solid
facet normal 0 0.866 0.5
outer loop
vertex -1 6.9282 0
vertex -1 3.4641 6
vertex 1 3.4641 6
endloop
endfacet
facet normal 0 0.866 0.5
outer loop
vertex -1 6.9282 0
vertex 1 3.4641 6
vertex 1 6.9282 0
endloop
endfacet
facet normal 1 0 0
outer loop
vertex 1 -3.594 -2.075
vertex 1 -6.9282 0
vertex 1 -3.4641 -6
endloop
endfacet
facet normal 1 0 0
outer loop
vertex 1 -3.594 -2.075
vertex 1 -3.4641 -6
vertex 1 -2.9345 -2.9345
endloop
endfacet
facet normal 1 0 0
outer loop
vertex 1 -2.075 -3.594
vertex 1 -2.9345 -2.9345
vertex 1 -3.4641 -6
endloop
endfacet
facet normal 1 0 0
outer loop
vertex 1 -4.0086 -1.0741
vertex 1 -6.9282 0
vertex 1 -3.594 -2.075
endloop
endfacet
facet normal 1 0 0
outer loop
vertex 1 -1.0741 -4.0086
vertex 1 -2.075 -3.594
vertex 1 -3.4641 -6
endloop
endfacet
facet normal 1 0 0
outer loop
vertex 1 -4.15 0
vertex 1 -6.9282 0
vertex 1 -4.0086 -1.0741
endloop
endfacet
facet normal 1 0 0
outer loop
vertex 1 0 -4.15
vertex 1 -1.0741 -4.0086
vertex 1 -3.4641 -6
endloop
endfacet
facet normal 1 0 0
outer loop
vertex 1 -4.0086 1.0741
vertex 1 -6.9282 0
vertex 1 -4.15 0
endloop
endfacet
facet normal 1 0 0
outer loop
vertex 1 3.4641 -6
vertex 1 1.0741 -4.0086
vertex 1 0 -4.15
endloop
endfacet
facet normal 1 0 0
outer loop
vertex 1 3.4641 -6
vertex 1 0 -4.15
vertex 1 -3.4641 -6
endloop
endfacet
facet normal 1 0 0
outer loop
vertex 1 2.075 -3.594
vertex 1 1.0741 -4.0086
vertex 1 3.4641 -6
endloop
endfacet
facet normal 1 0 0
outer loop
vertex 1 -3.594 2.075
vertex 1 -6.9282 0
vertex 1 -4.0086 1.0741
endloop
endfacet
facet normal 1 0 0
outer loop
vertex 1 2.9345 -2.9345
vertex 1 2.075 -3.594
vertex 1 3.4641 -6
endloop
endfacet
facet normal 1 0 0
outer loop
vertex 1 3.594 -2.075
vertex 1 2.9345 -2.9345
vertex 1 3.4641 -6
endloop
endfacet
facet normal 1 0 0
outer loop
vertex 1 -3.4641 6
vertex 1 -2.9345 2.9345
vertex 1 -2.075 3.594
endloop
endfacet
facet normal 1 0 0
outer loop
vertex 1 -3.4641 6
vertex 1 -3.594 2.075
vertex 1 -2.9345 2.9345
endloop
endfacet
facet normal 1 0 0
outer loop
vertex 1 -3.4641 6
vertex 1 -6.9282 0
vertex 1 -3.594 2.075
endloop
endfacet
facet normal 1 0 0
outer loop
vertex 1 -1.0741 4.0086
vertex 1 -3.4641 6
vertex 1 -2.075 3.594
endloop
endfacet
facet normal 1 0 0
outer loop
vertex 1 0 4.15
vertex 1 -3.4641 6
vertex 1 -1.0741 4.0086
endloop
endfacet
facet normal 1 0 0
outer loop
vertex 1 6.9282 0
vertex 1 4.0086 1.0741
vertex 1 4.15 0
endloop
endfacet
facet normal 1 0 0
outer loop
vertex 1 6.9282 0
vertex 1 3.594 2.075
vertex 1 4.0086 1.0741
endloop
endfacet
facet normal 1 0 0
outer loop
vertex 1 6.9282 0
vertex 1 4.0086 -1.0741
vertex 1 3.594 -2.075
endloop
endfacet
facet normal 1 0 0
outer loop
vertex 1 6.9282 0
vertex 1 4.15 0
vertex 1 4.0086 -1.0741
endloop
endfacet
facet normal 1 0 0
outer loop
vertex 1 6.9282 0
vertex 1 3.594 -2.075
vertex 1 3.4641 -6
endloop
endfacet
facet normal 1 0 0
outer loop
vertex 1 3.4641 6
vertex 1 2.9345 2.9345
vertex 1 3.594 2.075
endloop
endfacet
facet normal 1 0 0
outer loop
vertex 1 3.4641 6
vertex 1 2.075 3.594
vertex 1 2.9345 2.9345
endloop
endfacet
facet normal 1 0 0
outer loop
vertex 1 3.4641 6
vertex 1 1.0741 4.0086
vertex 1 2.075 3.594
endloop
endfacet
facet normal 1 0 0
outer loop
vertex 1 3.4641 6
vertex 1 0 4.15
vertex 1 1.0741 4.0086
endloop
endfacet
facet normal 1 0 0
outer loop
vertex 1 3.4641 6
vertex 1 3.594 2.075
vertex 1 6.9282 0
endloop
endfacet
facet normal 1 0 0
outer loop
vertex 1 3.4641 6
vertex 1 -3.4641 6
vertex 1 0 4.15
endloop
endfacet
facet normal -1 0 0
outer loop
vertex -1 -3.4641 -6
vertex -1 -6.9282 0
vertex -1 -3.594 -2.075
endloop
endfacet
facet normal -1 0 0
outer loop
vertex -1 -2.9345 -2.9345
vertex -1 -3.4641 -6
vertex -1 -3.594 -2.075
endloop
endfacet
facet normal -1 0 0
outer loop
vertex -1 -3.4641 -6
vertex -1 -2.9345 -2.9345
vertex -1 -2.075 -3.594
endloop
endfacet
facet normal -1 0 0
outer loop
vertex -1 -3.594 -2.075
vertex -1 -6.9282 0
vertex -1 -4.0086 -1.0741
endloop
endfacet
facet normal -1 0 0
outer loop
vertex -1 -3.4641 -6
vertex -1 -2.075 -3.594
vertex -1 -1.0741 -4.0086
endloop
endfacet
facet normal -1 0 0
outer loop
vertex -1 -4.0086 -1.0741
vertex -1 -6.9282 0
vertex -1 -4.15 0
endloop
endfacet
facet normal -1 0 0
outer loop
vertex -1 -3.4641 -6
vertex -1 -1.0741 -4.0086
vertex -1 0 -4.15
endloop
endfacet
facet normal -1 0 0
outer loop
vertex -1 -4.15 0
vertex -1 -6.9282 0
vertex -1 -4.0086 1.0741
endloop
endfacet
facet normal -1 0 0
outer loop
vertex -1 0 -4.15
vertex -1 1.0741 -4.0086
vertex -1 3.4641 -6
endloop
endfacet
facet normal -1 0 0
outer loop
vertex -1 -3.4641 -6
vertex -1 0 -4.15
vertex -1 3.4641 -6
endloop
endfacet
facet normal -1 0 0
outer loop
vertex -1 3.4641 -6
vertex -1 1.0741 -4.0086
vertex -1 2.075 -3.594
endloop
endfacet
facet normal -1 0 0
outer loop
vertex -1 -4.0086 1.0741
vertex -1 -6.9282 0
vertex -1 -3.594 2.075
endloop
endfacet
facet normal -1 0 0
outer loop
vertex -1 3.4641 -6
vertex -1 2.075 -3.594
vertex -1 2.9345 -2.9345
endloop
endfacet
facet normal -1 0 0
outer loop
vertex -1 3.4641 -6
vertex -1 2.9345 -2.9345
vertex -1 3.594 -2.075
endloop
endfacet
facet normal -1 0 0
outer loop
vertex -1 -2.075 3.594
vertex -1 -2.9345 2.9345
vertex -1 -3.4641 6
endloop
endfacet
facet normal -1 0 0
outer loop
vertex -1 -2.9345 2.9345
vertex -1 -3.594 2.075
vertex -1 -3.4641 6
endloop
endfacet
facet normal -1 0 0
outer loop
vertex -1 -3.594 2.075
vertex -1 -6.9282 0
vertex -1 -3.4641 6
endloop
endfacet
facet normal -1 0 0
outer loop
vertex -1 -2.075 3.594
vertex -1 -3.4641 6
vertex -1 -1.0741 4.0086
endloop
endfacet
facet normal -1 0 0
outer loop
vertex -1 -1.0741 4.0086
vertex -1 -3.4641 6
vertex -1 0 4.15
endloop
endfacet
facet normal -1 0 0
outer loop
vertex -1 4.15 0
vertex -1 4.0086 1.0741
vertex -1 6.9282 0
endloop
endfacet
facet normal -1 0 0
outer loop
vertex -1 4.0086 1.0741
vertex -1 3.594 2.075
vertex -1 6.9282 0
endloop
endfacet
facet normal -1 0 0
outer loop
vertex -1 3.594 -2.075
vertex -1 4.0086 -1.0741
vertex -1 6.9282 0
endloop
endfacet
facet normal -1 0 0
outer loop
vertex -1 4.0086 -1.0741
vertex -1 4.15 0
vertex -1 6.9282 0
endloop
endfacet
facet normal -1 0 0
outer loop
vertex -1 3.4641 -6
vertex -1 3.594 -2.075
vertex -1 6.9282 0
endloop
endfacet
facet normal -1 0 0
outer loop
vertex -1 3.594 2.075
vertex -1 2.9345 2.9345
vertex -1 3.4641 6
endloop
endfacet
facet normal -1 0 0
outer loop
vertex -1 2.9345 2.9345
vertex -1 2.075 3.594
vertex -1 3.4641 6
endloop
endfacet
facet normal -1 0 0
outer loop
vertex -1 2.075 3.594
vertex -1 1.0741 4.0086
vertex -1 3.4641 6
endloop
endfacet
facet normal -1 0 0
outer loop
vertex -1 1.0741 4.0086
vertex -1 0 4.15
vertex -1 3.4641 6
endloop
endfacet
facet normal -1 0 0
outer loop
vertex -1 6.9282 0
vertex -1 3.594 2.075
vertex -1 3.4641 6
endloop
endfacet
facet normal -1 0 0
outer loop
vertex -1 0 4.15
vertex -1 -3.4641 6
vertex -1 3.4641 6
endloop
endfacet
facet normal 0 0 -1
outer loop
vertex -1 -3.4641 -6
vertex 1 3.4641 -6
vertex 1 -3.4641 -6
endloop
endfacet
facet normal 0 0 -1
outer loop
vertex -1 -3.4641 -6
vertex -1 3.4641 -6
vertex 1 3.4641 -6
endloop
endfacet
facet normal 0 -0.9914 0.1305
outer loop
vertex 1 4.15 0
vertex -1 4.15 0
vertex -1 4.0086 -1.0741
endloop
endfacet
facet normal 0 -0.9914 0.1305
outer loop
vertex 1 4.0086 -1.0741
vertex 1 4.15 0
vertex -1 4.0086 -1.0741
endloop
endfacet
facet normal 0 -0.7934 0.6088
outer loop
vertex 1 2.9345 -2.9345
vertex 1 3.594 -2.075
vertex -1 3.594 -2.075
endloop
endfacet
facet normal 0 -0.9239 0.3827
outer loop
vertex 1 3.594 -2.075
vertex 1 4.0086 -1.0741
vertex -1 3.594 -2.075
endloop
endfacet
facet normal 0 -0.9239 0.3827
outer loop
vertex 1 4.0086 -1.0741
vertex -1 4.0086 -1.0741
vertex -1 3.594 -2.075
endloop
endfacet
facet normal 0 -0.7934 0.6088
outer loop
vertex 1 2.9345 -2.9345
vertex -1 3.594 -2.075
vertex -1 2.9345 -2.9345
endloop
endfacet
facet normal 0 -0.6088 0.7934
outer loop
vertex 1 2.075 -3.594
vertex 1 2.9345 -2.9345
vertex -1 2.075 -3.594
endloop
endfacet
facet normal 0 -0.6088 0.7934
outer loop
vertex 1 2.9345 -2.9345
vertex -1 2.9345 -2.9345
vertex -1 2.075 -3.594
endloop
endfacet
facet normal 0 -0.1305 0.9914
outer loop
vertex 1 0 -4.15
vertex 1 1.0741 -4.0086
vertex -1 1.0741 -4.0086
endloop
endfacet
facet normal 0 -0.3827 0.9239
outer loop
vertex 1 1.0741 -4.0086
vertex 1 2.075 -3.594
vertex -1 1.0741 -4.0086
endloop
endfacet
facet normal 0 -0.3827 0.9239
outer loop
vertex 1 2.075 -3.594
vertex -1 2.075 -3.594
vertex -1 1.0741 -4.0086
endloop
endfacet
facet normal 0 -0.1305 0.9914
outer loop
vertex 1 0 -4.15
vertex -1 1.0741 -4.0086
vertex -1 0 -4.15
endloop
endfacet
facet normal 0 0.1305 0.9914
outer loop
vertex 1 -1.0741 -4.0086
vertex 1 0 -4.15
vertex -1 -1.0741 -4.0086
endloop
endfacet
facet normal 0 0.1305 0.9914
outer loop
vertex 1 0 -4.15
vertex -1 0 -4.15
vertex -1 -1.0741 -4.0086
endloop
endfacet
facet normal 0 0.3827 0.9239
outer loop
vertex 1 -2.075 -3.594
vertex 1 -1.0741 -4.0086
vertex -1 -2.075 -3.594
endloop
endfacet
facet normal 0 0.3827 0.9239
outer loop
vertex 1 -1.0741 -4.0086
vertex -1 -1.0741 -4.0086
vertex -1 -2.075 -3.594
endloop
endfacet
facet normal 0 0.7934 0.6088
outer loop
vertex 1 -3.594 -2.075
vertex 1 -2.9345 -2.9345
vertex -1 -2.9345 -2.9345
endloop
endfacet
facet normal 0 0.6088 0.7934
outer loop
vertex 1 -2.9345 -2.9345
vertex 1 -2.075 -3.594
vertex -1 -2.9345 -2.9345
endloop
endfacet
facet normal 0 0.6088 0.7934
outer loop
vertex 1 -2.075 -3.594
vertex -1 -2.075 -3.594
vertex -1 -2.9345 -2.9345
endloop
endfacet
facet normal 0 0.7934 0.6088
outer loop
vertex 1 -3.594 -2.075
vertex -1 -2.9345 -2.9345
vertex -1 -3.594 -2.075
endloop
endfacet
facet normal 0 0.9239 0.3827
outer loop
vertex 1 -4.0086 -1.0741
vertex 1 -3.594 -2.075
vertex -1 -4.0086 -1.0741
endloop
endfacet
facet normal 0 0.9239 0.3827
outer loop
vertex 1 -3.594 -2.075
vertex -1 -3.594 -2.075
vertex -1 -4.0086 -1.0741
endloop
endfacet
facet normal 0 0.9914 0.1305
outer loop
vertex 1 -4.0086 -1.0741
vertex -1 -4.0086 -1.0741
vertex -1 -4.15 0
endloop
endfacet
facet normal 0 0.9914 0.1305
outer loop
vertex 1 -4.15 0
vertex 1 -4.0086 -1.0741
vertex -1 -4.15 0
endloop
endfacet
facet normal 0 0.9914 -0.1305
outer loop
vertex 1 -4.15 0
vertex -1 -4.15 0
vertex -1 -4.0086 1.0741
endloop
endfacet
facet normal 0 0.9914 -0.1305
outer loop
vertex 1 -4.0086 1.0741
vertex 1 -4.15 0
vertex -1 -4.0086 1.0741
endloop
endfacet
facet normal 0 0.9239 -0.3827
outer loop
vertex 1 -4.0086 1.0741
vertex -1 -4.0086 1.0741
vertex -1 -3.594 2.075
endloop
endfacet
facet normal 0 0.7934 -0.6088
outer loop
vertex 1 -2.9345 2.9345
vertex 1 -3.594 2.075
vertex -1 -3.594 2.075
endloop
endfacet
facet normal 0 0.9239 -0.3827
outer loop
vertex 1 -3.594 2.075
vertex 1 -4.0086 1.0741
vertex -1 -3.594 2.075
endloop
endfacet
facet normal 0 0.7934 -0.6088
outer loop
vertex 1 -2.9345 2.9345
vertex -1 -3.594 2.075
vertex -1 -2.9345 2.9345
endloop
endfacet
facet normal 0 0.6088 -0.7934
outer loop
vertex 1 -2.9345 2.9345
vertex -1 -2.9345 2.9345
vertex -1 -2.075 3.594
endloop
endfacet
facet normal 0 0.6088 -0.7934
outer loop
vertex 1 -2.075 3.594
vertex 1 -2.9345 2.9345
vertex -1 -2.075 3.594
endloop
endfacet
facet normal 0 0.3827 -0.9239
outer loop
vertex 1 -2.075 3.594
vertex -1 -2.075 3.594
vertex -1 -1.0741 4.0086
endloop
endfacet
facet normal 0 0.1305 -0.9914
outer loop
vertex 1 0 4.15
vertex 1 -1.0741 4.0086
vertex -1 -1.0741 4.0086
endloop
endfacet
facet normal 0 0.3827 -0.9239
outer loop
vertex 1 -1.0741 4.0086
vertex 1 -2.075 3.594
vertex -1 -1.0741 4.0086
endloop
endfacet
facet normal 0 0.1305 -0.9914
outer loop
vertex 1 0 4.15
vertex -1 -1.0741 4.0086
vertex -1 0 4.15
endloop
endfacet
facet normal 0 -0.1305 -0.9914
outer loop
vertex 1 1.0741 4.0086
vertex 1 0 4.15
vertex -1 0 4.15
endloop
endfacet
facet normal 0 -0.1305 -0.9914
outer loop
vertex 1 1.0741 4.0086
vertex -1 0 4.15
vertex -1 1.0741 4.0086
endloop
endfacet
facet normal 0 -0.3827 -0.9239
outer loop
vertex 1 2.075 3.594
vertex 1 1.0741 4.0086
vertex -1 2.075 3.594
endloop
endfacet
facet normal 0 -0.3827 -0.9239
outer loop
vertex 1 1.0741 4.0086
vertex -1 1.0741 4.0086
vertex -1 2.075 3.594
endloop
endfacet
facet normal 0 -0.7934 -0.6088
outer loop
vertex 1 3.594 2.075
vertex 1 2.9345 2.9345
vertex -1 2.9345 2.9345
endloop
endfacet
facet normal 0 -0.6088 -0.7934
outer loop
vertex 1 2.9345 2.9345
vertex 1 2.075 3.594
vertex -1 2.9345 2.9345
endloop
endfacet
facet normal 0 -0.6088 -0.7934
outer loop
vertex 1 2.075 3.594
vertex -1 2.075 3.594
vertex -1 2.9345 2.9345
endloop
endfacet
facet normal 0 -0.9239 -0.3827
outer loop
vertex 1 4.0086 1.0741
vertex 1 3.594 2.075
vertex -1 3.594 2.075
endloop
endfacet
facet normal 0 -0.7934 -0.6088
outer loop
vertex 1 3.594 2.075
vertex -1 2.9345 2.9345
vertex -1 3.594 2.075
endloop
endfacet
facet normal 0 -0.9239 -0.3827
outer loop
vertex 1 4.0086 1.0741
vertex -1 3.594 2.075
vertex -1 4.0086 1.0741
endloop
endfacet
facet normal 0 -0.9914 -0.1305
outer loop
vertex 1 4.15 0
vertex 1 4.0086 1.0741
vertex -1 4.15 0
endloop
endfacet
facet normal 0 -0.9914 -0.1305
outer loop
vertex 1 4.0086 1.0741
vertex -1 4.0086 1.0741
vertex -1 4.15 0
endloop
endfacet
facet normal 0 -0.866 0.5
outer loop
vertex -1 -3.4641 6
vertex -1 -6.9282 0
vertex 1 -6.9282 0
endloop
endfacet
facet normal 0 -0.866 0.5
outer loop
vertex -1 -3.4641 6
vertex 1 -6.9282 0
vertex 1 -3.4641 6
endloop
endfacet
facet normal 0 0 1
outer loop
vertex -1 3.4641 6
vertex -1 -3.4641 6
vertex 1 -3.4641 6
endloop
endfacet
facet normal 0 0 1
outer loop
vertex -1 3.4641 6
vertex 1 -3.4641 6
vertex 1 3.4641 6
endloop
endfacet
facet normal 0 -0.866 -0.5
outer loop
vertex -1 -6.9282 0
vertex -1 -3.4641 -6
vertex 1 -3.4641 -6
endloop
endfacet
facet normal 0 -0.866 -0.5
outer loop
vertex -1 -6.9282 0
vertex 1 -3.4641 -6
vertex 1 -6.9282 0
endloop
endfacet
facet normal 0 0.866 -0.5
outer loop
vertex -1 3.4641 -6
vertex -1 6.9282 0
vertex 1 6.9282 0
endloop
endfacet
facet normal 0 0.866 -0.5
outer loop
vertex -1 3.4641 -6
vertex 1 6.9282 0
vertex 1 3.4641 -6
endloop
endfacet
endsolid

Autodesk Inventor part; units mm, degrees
ref_plane "YZ Plane" through (0, 0, 0) normal (1, 0, 0) x (0, 1, 0)
ref_plane "XZ Plane" through (0, 0, 0) normal (0, 1, 0) x (-1, 0, 0)
ref_plane "XY Plane" through (0, 0, 0) normal (0, 0, 1) x (1, 0, 0)
sketch "Sketch1" plane through (0, 0, 0) normal (1, 0, 0) x (0, 1, 0)
  line L0 (6.9282, 0) -> (3.4641, -6)
  line L1 (3.4641, -6) -> (-3.4641, -6)
  line L2 (-3.4641, -6) -> (-6.9282, 0)
  line L3 (-6.9282, 0) -> (-3.4641, 6)
  line L4 (-3.4641, 6) -> (3.4641, 6)
  line L5 (3.4641, 6) -> (6.9282, 0)
  circle A0 centre (0, 0) radius 4.15
  dimension "d0" = 12
  dimension "d1" = 8.3
extrude "Extrusion1" add sketch "Sketch1" along normal mid plane 2
thread "Thread1" size "M8x1" class "6H" standard "ANSI Metric M Profile" full length
properties part number "Porca do Plug P10"
